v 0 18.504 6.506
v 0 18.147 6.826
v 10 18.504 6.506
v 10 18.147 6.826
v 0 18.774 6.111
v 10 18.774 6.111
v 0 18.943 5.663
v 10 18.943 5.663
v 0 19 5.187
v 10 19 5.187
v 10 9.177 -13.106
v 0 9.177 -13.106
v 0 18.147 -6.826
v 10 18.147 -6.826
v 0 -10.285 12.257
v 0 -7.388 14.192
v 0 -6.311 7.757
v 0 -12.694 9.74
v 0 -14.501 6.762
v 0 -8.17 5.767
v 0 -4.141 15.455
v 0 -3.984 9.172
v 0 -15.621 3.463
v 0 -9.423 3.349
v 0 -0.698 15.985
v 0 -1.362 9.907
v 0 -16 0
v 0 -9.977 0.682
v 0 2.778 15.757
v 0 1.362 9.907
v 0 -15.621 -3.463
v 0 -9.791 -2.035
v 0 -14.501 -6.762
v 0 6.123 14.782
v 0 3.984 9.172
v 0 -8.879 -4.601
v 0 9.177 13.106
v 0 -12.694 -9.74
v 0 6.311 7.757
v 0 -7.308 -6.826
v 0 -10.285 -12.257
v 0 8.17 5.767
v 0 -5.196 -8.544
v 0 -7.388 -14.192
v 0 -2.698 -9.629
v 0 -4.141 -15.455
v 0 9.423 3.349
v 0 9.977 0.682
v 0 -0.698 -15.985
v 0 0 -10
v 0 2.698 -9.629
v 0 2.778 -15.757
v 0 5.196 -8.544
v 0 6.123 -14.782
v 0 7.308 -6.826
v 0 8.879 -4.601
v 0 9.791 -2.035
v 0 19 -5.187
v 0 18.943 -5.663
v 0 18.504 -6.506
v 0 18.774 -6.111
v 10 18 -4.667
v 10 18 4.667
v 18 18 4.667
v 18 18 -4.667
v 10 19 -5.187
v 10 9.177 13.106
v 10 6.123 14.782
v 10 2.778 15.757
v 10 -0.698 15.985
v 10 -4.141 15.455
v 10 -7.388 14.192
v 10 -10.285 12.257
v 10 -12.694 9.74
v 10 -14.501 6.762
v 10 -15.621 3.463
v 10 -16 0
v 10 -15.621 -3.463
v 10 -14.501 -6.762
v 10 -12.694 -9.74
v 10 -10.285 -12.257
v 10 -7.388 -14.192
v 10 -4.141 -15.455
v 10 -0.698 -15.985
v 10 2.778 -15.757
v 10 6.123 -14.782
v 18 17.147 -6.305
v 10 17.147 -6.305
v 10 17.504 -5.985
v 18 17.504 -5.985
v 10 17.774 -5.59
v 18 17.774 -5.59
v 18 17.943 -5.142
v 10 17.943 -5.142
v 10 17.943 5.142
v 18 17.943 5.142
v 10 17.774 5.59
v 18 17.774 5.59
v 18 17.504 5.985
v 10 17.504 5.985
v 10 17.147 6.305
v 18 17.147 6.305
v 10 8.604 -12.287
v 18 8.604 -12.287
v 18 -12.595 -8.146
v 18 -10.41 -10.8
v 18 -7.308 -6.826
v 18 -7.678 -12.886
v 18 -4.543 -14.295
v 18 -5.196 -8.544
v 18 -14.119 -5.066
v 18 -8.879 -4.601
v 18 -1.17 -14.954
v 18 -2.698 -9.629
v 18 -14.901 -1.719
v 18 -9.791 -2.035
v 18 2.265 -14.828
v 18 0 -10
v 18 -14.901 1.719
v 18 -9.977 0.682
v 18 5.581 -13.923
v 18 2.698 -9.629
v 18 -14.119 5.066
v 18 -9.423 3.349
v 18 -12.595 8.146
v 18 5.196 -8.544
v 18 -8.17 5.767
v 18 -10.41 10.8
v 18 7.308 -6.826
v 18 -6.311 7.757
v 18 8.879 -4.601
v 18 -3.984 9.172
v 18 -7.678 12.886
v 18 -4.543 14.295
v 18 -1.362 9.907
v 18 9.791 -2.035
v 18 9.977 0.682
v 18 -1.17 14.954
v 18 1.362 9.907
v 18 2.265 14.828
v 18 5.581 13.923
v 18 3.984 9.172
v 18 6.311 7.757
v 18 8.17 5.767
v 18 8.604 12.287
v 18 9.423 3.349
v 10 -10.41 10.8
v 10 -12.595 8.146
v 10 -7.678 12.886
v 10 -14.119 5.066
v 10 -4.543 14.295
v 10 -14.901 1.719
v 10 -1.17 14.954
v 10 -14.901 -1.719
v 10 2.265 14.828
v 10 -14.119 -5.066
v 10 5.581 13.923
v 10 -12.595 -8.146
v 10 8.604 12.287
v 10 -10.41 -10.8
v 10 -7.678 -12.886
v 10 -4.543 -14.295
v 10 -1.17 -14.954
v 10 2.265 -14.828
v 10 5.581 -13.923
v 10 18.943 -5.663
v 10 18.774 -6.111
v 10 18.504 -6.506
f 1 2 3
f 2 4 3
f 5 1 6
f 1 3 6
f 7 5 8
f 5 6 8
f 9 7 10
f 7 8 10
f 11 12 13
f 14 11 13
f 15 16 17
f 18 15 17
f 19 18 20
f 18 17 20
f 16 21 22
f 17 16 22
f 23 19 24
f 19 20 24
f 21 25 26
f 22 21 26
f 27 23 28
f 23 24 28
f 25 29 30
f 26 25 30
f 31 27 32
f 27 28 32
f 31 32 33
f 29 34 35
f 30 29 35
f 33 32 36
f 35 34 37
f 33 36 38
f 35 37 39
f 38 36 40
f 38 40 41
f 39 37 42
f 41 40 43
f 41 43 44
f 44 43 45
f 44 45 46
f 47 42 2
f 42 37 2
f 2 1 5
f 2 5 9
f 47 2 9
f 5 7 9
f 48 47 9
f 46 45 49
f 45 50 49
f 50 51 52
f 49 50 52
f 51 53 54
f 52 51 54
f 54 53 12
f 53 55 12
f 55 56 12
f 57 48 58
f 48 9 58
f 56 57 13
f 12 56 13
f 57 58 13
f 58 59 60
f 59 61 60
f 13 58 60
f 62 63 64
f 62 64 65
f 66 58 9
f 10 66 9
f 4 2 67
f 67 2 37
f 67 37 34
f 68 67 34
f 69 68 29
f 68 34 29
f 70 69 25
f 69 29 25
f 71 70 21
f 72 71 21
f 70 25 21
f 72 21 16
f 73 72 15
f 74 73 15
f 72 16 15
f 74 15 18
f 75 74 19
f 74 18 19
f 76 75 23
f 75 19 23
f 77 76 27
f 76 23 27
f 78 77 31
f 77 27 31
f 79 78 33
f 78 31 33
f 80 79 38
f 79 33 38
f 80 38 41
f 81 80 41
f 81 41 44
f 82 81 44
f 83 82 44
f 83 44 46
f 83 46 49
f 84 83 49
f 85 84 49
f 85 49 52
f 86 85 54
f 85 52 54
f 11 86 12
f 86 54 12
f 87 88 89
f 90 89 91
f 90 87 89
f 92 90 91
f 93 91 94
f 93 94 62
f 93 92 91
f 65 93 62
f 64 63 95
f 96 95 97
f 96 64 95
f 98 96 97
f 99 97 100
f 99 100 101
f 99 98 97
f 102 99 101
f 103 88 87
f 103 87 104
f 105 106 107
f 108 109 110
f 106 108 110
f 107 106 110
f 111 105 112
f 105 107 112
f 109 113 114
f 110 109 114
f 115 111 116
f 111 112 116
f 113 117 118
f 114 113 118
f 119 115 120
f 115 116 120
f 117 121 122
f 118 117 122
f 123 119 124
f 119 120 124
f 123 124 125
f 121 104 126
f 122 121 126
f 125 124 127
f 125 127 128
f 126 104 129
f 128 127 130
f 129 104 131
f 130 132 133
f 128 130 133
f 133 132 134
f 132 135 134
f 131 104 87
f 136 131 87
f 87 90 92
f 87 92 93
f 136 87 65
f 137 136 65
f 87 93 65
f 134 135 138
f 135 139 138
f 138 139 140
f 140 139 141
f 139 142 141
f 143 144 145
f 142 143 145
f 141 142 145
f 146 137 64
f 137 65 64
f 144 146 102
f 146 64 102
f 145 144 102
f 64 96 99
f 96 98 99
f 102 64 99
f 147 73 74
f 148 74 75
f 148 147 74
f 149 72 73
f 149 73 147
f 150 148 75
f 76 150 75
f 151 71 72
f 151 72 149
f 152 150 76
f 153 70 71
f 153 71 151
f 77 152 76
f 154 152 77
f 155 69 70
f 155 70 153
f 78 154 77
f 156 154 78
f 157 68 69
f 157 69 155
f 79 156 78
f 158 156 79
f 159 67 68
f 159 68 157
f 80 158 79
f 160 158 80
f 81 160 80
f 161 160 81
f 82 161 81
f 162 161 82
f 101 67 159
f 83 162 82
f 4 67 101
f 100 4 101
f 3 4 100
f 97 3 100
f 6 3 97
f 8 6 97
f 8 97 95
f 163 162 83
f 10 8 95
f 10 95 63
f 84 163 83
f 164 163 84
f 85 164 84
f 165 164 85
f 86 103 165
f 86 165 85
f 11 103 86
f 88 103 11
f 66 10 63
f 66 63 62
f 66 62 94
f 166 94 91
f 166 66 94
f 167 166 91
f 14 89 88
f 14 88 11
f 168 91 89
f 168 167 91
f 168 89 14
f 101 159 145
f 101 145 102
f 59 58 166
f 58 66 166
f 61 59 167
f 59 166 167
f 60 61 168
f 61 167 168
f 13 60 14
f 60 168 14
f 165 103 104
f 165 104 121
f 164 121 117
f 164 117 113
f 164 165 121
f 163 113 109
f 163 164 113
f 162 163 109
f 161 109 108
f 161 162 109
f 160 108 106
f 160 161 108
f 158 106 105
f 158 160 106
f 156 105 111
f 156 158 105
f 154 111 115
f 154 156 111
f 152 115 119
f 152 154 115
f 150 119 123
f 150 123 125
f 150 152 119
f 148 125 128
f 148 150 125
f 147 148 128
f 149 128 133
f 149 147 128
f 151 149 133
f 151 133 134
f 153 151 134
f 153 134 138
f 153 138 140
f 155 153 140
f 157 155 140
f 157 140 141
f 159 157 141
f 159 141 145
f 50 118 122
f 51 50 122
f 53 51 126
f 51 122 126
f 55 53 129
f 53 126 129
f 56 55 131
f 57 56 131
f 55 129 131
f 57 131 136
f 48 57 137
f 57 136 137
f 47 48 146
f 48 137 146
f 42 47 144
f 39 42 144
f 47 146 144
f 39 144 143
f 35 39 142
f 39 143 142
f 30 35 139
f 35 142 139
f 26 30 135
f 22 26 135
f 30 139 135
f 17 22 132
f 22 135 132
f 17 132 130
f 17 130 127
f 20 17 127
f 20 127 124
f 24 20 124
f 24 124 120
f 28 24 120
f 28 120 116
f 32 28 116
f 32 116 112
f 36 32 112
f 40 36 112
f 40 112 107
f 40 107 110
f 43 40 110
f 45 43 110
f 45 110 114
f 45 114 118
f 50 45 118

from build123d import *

# Parameters (mm, degrees)
AUFSATZ_LINEAR_AUSTRAGEN1_DEPTH = 10
AUFSATZ_LINEAR_AUSTRAGEN2_DEPTH = 8
VERRUNDUNG1_R                   = 2
SCHNITT_LINEAR_AUSTRAGEN1_REACH = 20
SKIZZE3_R                       = 10


with BuildPart() as part:
    # Skizze1 → Aufsatz-Linear austragen1 (new body)
    with BuildSketch(Plane(origin=(0, 0, 0), x_dir=(0, 0, -1), z_dir=(1, 0, 0))):
        with BuildLine():
            Line((-6.228450194, 19), (-13.106432709, 9.177222982))
            ThreePointArc((-13.106432709, 9.177222982), (0, -16), (13.106432709, 9.177222982))
            Line((13.106432709, 9.177222982), (6.228450194, 19))
            Line((6.228450194, 19), (-6.228450194, 19))
        make_face()
    extrude(amount=AUFSATZ_LINEAR_AUSTRAGEN1_DEPTH)

    # Skizze2 → Aufsatz-Linear austragen2 (add)
    with BuildSketch(Plane(origin=(10, 0, 0), x_dir=(0, 0, -1), z_dir=(1, 0, 0))):
        with BuildLine():
            Line((-12.287280664, 8.603646545), (-5.707883144, 18))
            Line((-5.707883144, 18), (5.707883144, 18))
            Line((5.707883144, 18), (12.287280664, 8.603646545))
            ThreePointArc((12.287280664, 8.603646545), (0, -15), (-12.287280664, 8.603646545))
        make_face()
    extrude(amount=AUFSATZ_LINEAR_AUSTRAGEN2_DEPTH)

    # Verrundung1
    verrundung1_edges = [part.edges().sort_by_distance(p)[0] for p in [
        (14, 18, -5.707883144),
        (14, 18, 5.707883144),
        (5, 19, -6.228450194),
        (5, 19, 6.228450194),
    ]]
    fillet(verrundung1_edges, radius=VERRUNDUNG1_R)

    # Skizze3 → Schnitt-Linear austragen1 (cut, up to next)
    with BuildSketch(Plane(origin=(18, 0, 0), x_dir=(0, 0, -1), z_dir=(1, 0, 0)), mode=Mode.PRIVATE) as schnitt_linear_austragen1_sk1:
        Circle(SKIZZE3_R)
    schnitt_linear_austragen1_tool1 = extrude(schnitt_linear_austragen1_sk1.sketch, amount=-SCHNITT_LINEAR_AUSTRAGEN1_REACH, mode=Mode.PRIVATE) & part.part
    add(schnitt_linear_austragen1_tool1.solids().sort_by_distance((18, 0, 0))[0], mode=Mode.SUBTRACT)


solid = part.part
